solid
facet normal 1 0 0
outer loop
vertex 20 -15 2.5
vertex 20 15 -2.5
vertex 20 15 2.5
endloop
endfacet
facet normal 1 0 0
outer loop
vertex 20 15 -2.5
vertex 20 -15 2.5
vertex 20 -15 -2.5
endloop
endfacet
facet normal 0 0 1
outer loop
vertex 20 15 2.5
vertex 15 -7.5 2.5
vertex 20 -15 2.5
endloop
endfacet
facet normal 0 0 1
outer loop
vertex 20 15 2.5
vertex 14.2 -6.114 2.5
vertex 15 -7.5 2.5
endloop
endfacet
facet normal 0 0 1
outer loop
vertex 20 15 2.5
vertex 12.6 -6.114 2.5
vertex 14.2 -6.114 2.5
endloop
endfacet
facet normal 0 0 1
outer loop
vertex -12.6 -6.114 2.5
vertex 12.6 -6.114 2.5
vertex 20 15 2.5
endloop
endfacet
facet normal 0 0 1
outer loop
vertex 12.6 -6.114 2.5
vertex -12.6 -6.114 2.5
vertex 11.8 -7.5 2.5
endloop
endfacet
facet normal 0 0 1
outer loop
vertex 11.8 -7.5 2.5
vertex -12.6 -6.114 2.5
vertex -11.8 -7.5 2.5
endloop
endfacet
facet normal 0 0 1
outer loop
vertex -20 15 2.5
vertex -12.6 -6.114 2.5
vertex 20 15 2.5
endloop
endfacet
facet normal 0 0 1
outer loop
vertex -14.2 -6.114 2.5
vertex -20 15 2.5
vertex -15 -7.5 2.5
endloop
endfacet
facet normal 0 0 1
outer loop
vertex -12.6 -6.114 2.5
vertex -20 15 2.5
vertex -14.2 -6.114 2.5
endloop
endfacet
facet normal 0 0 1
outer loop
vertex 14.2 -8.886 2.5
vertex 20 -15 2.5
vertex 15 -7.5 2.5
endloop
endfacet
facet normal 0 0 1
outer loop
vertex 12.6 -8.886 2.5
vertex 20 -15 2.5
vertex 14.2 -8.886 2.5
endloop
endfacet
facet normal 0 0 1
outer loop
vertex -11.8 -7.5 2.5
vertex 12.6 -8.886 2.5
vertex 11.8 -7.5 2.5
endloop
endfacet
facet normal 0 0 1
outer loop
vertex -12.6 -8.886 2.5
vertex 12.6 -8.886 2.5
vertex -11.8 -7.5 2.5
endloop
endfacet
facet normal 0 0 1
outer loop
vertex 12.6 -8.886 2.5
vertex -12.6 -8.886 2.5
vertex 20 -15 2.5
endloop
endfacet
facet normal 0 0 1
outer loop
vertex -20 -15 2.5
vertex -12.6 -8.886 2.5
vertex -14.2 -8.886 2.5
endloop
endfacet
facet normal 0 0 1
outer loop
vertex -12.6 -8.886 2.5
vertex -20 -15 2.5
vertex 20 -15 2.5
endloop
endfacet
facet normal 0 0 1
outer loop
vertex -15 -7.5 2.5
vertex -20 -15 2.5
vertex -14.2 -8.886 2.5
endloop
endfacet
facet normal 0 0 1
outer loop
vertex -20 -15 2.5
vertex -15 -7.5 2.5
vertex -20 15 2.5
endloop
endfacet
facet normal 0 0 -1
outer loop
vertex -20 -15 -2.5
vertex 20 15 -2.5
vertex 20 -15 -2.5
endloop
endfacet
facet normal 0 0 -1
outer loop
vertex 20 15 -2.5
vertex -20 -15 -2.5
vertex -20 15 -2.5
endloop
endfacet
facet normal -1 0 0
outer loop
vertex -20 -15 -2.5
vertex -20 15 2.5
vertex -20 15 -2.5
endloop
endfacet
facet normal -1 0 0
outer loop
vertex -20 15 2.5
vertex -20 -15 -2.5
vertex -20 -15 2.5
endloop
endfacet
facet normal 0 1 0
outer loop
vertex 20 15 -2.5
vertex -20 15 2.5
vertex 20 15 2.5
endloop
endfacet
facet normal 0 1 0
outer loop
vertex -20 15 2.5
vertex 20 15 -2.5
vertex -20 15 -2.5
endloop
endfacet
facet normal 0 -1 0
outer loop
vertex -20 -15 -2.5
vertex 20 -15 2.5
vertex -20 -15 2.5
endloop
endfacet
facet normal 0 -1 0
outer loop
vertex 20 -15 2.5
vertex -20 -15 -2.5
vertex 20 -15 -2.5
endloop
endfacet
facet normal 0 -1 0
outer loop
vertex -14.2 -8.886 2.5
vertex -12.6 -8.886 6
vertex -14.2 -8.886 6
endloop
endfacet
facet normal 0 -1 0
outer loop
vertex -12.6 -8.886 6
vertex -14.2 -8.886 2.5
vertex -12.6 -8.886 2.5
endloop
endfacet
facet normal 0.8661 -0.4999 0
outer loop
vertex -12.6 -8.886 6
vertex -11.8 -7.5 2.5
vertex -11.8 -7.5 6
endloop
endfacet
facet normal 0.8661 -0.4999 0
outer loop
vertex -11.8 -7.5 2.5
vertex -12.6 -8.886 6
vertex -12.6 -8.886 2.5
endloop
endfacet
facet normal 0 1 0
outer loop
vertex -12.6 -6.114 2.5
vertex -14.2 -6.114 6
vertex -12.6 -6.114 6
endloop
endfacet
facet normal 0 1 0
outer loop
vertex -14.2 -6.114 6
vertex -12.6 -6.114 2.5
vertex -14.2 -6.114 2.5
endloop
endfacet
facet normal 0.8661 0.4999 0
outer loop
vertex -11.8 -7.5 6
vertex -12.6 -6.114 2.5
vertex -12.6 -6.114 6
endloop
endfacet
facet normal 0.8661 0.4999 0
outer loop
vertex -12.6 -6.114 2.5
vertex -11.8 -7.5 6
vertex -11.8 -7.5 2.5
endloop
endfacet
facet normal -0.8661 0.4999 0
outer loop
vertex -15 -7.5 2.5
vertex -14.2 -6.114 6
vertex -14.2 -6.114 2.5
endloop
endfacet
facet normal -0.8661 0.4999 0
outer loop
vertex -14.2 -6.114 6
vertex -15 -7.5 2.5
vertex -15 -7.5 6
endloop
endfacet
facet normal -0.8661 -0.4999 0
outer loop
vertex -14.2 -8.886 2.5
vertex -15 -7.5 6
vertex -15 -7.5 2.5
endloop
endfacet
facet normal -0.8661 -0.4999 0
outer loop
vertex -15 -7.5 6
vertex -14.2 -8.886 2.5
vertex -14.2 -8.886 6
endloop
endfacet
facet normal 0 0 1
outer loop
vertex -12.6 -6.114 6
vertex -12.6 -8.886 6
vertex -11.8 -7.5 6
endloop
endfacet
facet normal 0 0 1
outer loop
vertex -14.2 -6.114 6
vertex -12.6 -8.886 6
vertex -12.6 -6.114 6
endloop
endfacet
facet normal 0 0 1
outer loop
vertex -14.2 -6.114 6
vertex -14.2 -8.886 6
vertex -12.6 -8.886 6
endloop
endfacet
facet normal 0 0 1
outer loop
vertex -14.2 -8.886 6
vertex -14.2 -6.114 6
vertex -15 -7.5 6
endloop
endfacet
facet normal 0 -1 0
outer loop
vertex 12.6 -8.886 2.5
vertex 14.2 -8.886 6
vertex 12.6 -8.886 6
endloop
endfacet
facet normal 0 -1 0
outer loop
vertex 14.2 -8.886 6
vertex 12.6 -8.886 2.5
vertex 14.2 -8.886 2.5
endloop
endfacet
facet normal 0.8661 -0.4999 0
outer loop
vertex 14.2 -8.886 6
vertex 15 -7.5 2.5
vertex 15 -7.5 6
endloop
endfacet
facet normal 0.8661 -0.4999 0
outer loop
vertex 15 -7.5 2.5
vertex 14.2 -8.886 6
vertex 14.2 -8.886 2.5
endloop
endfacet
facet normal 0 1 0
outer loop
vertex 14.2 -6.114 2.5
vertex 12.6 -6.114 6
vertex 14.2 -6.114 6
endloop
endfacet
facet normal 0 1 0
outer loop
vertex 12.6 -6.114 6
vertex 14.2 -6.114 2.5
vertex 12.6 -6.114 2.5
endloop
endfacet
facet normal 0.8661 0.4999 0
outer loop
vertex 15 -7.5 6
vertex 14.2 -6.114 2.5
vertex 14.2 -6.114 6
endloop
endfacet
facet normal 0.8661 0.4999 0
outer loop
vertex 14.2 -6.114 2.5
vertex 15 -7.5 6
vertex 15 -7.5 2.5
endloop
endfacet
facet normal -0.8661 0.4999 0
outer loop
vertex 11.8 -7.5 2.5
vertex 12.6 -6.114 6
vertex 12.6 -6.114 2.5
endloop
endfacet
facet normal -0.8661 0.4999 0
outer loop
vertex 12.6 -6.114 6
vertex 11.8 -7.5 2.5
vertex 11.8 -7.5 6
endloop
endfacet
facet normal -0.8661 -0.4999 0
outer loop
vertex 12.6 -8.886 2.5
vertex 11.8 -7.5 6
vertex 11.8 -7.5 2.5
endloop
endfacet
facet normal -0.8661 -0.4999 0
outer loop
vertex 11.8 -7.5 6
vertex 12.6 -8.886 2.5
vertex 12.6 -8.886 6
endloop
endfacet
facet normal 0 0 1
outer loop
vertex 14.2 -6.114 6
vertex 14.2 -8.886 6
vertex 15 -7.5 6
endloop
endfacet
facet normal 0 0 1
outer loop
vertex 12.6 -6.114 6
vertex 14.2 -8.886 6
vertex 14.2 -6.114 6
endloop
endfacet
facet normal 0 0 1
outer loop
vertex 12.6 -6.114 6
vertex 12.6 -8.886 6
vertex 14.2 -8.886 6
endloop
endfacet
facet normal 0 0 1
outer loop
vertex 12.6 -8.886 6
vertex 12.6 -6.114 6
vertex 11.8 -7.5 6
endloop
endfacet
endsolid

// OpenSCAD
// filename: mount_base_v1.scad
// model: GPT-4
// prompt: Generate an OpenSCAD file that generates a base where this part can be mounted with two screws. Make all inputs parameters. Make the base height and base tilt an input as well.

// Parameters for the mount base
base_length = 40;          // Length of the base
base_width = 30;           // Width of the base
base_height = 5;           // Height of the base
mount_hole_diameter = 3.2; // Diameter of the mount holes
hole_distance_x = 26.8;    // Distance between the holes in X direction
hole_distance_y = 15.0;    // Distance between the holes in Y direction
base_tilt = 0;             // Tilt angle of the base

module mount_base(length, width, height, hole_diam, dist_x, dist_y, tilt) {
    // Apply tilt to the base
    rotate([tilt, 0, 0]) {
        // Create the base
        cube([length, width, height], center = true);
        
        // Create holes for mounting screws
        translate([-dist_x/2, -dist_y/2, height/2])
            cylinder(h = height + 2, d = hole_diam, center = true);
        translate([dist_x/2, -dist_y/2, height/2])
            cylinder(h = height + 2, d = hole_diam, center = true);
    }
}

// Base generation
mount_base(base_length, base_width, base_height, mount_hole_diameter, hole_distance_x, hole_distance_y, base_tilt);
